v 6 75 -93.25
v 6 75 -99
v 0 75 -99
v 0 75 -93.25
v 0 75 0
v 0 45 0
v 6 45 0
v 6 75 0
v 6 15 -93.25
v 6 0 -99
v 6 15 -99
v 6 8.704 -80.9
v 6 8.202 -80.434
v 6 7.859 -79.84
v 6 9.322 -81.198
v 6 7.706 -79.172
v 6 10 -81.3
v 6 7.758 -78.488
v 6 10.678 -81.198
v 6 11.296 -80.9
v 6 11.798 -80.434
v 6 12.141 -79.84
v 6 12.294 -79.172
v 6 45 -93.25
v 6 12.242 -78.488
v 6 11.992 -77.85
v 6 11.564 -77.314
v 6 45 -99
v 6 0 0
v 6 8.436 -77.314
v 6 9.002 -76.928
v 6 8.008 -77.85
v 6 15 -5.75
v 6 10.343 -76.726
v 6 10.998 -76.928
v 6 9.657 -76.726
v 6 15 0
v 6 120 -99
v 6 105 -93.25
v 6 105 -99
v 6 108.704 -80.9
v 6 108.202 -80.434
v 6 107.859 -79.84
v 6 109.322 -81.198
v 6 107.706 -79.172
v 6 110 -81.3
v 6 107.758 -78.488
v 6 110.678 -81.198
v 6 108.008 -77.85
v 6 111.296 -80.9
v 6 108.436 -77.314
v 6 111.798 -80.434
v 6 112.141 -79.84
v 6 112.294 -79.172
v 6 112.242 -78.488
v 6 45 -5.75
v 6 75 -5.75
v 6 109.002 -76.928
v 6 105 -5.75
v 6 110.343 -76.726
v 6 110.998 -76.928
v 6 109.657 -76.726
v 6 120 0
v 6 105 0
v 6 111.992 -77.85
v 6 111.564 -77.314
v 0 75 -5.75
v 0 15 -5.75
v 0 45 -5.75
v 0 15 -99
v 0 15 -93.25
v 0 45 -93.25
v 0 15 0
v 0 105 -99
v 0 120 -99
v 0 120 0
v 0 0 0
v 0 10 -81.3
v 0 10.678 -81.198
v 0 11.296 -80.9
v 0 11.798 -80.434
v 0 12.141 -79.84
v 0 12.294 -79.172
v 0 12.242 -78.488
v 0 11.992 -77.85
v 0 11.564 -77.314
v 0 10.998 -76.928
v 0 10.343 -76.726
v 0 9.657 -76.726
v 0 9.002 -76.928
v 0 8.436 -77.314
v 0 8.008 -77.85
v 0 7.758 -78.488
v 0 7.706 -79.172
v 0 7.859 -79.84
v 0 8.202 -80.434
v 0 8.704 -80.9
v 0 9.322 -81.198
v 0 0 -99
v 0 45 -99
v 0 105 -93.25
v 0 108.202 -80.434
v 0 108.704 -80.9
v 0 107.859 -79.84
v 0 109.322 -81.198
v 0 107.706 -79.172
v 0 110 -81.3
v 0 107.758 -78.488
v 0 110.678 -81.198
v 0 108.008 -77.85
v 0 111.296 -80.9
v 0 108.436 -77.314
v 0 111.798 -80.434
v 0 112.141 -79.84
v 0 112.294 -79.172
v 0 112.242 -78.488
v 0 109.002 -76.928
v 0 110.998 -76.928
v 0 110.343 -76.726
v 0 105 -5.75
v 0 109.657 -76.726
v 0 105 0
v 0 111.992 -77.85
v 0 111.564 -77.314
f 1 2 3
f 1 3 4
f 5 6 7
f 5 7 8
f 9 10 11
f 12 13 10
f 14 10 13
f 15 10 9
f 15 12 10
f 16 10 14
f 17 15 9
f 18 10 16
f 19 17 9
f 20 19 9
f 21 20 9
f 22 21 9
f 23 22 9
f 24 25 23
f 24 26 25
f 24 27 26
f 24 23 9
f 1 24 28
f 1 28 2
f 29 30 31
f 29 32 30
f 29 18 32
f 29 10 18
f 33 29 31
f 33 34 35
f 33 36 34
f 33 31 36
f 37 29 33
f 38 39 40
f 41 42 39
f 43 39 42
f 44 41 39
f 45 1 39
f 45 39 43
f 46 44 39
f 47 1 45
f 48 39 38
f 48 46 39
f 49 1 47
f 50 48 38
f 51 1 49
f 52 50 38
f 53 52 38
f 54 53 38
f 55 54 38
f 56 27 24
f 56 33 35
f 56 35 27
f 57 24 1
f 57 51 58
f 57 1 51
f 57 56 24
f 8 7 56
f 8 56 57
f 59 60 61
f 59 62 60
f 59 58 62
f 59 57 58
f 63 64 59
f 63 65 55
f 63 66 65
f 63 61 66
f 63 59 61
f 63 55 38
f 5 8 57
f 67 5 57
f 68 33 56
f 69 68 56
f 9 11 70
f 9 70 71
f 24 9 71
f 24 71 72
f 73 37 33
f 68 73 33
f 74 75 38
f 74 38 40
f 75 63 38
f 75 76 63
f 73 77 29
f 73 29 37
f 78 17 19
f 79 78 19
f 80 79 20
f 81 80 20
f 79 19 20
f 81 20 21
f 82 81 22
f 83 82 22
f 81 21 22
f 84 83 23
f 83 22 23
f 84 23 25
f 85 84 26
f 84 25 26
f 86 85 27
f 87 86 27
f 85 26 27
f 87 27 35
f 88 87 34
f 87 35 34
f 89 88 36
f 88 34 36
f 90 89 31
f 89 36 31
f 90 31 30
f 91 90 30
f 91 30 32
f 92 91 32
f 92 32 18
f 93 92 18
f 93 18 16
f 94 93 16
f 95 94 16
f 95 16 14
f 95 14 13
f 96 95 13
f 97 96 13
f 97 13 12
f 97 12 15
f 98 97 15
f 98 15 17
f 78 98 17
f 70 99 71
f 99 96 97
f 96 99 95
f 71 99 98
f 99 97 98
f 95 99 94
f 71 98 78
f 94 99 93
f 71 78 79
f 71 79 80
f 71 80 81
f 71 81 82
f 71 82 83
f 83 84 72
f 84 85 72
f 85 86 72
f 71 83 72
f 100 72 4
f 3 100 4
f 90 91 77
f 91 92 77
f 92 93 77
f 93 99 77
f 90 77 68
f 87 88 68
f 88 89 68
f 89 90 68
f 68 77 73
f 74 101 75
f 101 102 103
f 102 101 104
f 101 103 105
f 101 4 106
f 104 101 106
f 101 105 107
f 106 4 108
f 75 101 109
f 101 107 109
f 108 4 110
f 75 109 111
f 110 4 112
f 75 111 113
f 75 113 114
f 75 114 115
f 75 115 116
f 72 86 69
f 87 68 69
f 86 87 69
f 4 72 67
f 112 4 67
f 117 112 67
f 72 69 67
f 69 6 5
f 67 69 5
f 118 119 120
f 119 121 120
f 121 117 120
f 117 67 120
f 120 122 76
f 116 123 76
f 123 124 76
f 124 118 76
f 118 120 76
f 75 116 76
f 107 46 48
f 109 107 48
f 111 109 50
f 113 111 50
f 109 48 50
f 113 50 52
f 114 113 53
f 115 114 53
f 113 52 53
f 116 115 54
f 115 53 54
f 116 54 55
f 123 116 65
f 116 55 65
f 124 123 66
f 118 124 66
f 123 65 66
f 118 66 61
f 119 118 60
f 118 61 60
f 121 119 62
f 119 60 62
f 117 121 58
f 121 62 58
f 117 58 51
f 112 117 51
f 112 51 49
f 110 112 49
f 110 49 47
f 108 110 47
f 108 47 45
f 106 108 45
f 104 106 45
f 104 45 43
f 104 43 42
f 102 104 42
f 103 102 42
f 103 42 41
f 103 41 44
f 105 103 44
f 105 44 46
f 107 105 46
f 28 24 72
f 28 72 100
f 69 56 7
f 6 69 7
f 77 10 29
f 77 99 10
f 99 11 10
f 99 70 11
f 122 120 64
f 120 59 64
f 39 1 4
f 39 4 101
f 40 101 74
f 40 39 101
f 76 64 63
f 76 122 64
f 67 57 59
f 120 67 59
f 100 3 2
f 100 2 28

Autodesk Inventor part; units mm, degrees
ref_plane "YZ Plane" through (0, 0, 0) normal (1, 0, 0) x (0, 1, 0)
ref_plane "XZ Plane" through (0, 0, 0) normal (0, 1, 0) x (-1, 0, 0)
ref_plane "XY Plane" through (0, 0, 0) normal (0, 0, 1) x (1, 0, 0)
sketch "Sketch1" plane through (0, 0, 0) normal (1, 0, 0) x (0, 1, 0)
  line L0 (0, 0) -> (120, 0)
  line L1 (120, 0) -> (120, -99)
  line L2 (120, -99) -> (0, -99)
  line L3 (0, -99) -> (0, 0)
  dimension "d0" = 120
  dimension "d1" = 99
extrude "Extrusion1" add sketch "Sketch1" along normal blind 6
sketch "Sketch2" plane through (6, 0, 0) normal (1, 0, 0) x (0, 0, -1)
  line L0 (0, 120) -> (0, 0) projected
  line L1 (0, 0) -> (99, 0) projected
  line L2 (99, 0) -> (99, 120) projected
  line L3 (99, 120) -> (0, 120) projected
  line L4 (0, 120) -> (0, 0) projected
  line L5 (0, 15) -> (5.75, 15)
  line L6 (5.75, 15) -> (5.75, 45)
  line L7 (5.75, 45) -> (0, 45)
  line L8 (0, 45) -> (0, 15)
  line L9 (0, 75) -> (5.75, 75)
  line L10 (5.75, 75) -> (5.75, 105)
  line L11 (5.75, 105) -> (0, 105)
  line L12 (0, 105) -> (0, 75)
  line L13 (99, 15) -> (93.25, 15)
  line L14 (93.25, 15) -> (93.25, 45)
  line L15 (93.25, 45) -> (99, 45)
  line L16 (99, 45) -> (99, 15)
  line L17 (99, 75) -> (93.25, 75)
  line L18 (93.25, 75) -> (93.25, 105)
  line L19 (93.25, 105) -> (99, 105)
  line L20 (99, 105) -> (99, 75)
  line L21 (-12.0657, 60) -> (104.2665, 60)
  line L22 (99, 120) -> (0, 120) projected
  dimension "d5" = 5.75
  dimension "d6" = 5.75
  dimension "d8" = 30
  dimension "d9" = 30
  dimension "d22" = 60
  dimension "d23" = 15
  dimension "d24" = 15
extrude "Extrusion2" cut sketch "Sketch2" against normal up to next contours L11 L10 L9 L0 | L2 L17 L18 L19 | L7 L6 L5 L0 | L2 L13 L14 L15
sketch "Sketch3" plane through (6, 0, 0) normal (1, 0, 0) x (0, 0, -1)
  circle A0 centre (79, 10) radius 2.3
  circle A1 centre (79, 110) radius 2.3
  line L0 (99, 105) -> (99, 120) projected
  line L1 (99, 120) -> (0, 120) projected
  line L2 (99, 0) -> (99, 15) projected
  line L3 (0, 0) -> (99, 0) projected
  dimension "d13" = 20
  dimension "d14" = 10
  dimension "d15" = 4.6
  dimension "d17" = 10
  dimension "d18" = 20
  dimension "d19" = 4.6
extrude "Extrusion3" cut sketch "Sketch3" against normal up to next
properties part number "Side"
